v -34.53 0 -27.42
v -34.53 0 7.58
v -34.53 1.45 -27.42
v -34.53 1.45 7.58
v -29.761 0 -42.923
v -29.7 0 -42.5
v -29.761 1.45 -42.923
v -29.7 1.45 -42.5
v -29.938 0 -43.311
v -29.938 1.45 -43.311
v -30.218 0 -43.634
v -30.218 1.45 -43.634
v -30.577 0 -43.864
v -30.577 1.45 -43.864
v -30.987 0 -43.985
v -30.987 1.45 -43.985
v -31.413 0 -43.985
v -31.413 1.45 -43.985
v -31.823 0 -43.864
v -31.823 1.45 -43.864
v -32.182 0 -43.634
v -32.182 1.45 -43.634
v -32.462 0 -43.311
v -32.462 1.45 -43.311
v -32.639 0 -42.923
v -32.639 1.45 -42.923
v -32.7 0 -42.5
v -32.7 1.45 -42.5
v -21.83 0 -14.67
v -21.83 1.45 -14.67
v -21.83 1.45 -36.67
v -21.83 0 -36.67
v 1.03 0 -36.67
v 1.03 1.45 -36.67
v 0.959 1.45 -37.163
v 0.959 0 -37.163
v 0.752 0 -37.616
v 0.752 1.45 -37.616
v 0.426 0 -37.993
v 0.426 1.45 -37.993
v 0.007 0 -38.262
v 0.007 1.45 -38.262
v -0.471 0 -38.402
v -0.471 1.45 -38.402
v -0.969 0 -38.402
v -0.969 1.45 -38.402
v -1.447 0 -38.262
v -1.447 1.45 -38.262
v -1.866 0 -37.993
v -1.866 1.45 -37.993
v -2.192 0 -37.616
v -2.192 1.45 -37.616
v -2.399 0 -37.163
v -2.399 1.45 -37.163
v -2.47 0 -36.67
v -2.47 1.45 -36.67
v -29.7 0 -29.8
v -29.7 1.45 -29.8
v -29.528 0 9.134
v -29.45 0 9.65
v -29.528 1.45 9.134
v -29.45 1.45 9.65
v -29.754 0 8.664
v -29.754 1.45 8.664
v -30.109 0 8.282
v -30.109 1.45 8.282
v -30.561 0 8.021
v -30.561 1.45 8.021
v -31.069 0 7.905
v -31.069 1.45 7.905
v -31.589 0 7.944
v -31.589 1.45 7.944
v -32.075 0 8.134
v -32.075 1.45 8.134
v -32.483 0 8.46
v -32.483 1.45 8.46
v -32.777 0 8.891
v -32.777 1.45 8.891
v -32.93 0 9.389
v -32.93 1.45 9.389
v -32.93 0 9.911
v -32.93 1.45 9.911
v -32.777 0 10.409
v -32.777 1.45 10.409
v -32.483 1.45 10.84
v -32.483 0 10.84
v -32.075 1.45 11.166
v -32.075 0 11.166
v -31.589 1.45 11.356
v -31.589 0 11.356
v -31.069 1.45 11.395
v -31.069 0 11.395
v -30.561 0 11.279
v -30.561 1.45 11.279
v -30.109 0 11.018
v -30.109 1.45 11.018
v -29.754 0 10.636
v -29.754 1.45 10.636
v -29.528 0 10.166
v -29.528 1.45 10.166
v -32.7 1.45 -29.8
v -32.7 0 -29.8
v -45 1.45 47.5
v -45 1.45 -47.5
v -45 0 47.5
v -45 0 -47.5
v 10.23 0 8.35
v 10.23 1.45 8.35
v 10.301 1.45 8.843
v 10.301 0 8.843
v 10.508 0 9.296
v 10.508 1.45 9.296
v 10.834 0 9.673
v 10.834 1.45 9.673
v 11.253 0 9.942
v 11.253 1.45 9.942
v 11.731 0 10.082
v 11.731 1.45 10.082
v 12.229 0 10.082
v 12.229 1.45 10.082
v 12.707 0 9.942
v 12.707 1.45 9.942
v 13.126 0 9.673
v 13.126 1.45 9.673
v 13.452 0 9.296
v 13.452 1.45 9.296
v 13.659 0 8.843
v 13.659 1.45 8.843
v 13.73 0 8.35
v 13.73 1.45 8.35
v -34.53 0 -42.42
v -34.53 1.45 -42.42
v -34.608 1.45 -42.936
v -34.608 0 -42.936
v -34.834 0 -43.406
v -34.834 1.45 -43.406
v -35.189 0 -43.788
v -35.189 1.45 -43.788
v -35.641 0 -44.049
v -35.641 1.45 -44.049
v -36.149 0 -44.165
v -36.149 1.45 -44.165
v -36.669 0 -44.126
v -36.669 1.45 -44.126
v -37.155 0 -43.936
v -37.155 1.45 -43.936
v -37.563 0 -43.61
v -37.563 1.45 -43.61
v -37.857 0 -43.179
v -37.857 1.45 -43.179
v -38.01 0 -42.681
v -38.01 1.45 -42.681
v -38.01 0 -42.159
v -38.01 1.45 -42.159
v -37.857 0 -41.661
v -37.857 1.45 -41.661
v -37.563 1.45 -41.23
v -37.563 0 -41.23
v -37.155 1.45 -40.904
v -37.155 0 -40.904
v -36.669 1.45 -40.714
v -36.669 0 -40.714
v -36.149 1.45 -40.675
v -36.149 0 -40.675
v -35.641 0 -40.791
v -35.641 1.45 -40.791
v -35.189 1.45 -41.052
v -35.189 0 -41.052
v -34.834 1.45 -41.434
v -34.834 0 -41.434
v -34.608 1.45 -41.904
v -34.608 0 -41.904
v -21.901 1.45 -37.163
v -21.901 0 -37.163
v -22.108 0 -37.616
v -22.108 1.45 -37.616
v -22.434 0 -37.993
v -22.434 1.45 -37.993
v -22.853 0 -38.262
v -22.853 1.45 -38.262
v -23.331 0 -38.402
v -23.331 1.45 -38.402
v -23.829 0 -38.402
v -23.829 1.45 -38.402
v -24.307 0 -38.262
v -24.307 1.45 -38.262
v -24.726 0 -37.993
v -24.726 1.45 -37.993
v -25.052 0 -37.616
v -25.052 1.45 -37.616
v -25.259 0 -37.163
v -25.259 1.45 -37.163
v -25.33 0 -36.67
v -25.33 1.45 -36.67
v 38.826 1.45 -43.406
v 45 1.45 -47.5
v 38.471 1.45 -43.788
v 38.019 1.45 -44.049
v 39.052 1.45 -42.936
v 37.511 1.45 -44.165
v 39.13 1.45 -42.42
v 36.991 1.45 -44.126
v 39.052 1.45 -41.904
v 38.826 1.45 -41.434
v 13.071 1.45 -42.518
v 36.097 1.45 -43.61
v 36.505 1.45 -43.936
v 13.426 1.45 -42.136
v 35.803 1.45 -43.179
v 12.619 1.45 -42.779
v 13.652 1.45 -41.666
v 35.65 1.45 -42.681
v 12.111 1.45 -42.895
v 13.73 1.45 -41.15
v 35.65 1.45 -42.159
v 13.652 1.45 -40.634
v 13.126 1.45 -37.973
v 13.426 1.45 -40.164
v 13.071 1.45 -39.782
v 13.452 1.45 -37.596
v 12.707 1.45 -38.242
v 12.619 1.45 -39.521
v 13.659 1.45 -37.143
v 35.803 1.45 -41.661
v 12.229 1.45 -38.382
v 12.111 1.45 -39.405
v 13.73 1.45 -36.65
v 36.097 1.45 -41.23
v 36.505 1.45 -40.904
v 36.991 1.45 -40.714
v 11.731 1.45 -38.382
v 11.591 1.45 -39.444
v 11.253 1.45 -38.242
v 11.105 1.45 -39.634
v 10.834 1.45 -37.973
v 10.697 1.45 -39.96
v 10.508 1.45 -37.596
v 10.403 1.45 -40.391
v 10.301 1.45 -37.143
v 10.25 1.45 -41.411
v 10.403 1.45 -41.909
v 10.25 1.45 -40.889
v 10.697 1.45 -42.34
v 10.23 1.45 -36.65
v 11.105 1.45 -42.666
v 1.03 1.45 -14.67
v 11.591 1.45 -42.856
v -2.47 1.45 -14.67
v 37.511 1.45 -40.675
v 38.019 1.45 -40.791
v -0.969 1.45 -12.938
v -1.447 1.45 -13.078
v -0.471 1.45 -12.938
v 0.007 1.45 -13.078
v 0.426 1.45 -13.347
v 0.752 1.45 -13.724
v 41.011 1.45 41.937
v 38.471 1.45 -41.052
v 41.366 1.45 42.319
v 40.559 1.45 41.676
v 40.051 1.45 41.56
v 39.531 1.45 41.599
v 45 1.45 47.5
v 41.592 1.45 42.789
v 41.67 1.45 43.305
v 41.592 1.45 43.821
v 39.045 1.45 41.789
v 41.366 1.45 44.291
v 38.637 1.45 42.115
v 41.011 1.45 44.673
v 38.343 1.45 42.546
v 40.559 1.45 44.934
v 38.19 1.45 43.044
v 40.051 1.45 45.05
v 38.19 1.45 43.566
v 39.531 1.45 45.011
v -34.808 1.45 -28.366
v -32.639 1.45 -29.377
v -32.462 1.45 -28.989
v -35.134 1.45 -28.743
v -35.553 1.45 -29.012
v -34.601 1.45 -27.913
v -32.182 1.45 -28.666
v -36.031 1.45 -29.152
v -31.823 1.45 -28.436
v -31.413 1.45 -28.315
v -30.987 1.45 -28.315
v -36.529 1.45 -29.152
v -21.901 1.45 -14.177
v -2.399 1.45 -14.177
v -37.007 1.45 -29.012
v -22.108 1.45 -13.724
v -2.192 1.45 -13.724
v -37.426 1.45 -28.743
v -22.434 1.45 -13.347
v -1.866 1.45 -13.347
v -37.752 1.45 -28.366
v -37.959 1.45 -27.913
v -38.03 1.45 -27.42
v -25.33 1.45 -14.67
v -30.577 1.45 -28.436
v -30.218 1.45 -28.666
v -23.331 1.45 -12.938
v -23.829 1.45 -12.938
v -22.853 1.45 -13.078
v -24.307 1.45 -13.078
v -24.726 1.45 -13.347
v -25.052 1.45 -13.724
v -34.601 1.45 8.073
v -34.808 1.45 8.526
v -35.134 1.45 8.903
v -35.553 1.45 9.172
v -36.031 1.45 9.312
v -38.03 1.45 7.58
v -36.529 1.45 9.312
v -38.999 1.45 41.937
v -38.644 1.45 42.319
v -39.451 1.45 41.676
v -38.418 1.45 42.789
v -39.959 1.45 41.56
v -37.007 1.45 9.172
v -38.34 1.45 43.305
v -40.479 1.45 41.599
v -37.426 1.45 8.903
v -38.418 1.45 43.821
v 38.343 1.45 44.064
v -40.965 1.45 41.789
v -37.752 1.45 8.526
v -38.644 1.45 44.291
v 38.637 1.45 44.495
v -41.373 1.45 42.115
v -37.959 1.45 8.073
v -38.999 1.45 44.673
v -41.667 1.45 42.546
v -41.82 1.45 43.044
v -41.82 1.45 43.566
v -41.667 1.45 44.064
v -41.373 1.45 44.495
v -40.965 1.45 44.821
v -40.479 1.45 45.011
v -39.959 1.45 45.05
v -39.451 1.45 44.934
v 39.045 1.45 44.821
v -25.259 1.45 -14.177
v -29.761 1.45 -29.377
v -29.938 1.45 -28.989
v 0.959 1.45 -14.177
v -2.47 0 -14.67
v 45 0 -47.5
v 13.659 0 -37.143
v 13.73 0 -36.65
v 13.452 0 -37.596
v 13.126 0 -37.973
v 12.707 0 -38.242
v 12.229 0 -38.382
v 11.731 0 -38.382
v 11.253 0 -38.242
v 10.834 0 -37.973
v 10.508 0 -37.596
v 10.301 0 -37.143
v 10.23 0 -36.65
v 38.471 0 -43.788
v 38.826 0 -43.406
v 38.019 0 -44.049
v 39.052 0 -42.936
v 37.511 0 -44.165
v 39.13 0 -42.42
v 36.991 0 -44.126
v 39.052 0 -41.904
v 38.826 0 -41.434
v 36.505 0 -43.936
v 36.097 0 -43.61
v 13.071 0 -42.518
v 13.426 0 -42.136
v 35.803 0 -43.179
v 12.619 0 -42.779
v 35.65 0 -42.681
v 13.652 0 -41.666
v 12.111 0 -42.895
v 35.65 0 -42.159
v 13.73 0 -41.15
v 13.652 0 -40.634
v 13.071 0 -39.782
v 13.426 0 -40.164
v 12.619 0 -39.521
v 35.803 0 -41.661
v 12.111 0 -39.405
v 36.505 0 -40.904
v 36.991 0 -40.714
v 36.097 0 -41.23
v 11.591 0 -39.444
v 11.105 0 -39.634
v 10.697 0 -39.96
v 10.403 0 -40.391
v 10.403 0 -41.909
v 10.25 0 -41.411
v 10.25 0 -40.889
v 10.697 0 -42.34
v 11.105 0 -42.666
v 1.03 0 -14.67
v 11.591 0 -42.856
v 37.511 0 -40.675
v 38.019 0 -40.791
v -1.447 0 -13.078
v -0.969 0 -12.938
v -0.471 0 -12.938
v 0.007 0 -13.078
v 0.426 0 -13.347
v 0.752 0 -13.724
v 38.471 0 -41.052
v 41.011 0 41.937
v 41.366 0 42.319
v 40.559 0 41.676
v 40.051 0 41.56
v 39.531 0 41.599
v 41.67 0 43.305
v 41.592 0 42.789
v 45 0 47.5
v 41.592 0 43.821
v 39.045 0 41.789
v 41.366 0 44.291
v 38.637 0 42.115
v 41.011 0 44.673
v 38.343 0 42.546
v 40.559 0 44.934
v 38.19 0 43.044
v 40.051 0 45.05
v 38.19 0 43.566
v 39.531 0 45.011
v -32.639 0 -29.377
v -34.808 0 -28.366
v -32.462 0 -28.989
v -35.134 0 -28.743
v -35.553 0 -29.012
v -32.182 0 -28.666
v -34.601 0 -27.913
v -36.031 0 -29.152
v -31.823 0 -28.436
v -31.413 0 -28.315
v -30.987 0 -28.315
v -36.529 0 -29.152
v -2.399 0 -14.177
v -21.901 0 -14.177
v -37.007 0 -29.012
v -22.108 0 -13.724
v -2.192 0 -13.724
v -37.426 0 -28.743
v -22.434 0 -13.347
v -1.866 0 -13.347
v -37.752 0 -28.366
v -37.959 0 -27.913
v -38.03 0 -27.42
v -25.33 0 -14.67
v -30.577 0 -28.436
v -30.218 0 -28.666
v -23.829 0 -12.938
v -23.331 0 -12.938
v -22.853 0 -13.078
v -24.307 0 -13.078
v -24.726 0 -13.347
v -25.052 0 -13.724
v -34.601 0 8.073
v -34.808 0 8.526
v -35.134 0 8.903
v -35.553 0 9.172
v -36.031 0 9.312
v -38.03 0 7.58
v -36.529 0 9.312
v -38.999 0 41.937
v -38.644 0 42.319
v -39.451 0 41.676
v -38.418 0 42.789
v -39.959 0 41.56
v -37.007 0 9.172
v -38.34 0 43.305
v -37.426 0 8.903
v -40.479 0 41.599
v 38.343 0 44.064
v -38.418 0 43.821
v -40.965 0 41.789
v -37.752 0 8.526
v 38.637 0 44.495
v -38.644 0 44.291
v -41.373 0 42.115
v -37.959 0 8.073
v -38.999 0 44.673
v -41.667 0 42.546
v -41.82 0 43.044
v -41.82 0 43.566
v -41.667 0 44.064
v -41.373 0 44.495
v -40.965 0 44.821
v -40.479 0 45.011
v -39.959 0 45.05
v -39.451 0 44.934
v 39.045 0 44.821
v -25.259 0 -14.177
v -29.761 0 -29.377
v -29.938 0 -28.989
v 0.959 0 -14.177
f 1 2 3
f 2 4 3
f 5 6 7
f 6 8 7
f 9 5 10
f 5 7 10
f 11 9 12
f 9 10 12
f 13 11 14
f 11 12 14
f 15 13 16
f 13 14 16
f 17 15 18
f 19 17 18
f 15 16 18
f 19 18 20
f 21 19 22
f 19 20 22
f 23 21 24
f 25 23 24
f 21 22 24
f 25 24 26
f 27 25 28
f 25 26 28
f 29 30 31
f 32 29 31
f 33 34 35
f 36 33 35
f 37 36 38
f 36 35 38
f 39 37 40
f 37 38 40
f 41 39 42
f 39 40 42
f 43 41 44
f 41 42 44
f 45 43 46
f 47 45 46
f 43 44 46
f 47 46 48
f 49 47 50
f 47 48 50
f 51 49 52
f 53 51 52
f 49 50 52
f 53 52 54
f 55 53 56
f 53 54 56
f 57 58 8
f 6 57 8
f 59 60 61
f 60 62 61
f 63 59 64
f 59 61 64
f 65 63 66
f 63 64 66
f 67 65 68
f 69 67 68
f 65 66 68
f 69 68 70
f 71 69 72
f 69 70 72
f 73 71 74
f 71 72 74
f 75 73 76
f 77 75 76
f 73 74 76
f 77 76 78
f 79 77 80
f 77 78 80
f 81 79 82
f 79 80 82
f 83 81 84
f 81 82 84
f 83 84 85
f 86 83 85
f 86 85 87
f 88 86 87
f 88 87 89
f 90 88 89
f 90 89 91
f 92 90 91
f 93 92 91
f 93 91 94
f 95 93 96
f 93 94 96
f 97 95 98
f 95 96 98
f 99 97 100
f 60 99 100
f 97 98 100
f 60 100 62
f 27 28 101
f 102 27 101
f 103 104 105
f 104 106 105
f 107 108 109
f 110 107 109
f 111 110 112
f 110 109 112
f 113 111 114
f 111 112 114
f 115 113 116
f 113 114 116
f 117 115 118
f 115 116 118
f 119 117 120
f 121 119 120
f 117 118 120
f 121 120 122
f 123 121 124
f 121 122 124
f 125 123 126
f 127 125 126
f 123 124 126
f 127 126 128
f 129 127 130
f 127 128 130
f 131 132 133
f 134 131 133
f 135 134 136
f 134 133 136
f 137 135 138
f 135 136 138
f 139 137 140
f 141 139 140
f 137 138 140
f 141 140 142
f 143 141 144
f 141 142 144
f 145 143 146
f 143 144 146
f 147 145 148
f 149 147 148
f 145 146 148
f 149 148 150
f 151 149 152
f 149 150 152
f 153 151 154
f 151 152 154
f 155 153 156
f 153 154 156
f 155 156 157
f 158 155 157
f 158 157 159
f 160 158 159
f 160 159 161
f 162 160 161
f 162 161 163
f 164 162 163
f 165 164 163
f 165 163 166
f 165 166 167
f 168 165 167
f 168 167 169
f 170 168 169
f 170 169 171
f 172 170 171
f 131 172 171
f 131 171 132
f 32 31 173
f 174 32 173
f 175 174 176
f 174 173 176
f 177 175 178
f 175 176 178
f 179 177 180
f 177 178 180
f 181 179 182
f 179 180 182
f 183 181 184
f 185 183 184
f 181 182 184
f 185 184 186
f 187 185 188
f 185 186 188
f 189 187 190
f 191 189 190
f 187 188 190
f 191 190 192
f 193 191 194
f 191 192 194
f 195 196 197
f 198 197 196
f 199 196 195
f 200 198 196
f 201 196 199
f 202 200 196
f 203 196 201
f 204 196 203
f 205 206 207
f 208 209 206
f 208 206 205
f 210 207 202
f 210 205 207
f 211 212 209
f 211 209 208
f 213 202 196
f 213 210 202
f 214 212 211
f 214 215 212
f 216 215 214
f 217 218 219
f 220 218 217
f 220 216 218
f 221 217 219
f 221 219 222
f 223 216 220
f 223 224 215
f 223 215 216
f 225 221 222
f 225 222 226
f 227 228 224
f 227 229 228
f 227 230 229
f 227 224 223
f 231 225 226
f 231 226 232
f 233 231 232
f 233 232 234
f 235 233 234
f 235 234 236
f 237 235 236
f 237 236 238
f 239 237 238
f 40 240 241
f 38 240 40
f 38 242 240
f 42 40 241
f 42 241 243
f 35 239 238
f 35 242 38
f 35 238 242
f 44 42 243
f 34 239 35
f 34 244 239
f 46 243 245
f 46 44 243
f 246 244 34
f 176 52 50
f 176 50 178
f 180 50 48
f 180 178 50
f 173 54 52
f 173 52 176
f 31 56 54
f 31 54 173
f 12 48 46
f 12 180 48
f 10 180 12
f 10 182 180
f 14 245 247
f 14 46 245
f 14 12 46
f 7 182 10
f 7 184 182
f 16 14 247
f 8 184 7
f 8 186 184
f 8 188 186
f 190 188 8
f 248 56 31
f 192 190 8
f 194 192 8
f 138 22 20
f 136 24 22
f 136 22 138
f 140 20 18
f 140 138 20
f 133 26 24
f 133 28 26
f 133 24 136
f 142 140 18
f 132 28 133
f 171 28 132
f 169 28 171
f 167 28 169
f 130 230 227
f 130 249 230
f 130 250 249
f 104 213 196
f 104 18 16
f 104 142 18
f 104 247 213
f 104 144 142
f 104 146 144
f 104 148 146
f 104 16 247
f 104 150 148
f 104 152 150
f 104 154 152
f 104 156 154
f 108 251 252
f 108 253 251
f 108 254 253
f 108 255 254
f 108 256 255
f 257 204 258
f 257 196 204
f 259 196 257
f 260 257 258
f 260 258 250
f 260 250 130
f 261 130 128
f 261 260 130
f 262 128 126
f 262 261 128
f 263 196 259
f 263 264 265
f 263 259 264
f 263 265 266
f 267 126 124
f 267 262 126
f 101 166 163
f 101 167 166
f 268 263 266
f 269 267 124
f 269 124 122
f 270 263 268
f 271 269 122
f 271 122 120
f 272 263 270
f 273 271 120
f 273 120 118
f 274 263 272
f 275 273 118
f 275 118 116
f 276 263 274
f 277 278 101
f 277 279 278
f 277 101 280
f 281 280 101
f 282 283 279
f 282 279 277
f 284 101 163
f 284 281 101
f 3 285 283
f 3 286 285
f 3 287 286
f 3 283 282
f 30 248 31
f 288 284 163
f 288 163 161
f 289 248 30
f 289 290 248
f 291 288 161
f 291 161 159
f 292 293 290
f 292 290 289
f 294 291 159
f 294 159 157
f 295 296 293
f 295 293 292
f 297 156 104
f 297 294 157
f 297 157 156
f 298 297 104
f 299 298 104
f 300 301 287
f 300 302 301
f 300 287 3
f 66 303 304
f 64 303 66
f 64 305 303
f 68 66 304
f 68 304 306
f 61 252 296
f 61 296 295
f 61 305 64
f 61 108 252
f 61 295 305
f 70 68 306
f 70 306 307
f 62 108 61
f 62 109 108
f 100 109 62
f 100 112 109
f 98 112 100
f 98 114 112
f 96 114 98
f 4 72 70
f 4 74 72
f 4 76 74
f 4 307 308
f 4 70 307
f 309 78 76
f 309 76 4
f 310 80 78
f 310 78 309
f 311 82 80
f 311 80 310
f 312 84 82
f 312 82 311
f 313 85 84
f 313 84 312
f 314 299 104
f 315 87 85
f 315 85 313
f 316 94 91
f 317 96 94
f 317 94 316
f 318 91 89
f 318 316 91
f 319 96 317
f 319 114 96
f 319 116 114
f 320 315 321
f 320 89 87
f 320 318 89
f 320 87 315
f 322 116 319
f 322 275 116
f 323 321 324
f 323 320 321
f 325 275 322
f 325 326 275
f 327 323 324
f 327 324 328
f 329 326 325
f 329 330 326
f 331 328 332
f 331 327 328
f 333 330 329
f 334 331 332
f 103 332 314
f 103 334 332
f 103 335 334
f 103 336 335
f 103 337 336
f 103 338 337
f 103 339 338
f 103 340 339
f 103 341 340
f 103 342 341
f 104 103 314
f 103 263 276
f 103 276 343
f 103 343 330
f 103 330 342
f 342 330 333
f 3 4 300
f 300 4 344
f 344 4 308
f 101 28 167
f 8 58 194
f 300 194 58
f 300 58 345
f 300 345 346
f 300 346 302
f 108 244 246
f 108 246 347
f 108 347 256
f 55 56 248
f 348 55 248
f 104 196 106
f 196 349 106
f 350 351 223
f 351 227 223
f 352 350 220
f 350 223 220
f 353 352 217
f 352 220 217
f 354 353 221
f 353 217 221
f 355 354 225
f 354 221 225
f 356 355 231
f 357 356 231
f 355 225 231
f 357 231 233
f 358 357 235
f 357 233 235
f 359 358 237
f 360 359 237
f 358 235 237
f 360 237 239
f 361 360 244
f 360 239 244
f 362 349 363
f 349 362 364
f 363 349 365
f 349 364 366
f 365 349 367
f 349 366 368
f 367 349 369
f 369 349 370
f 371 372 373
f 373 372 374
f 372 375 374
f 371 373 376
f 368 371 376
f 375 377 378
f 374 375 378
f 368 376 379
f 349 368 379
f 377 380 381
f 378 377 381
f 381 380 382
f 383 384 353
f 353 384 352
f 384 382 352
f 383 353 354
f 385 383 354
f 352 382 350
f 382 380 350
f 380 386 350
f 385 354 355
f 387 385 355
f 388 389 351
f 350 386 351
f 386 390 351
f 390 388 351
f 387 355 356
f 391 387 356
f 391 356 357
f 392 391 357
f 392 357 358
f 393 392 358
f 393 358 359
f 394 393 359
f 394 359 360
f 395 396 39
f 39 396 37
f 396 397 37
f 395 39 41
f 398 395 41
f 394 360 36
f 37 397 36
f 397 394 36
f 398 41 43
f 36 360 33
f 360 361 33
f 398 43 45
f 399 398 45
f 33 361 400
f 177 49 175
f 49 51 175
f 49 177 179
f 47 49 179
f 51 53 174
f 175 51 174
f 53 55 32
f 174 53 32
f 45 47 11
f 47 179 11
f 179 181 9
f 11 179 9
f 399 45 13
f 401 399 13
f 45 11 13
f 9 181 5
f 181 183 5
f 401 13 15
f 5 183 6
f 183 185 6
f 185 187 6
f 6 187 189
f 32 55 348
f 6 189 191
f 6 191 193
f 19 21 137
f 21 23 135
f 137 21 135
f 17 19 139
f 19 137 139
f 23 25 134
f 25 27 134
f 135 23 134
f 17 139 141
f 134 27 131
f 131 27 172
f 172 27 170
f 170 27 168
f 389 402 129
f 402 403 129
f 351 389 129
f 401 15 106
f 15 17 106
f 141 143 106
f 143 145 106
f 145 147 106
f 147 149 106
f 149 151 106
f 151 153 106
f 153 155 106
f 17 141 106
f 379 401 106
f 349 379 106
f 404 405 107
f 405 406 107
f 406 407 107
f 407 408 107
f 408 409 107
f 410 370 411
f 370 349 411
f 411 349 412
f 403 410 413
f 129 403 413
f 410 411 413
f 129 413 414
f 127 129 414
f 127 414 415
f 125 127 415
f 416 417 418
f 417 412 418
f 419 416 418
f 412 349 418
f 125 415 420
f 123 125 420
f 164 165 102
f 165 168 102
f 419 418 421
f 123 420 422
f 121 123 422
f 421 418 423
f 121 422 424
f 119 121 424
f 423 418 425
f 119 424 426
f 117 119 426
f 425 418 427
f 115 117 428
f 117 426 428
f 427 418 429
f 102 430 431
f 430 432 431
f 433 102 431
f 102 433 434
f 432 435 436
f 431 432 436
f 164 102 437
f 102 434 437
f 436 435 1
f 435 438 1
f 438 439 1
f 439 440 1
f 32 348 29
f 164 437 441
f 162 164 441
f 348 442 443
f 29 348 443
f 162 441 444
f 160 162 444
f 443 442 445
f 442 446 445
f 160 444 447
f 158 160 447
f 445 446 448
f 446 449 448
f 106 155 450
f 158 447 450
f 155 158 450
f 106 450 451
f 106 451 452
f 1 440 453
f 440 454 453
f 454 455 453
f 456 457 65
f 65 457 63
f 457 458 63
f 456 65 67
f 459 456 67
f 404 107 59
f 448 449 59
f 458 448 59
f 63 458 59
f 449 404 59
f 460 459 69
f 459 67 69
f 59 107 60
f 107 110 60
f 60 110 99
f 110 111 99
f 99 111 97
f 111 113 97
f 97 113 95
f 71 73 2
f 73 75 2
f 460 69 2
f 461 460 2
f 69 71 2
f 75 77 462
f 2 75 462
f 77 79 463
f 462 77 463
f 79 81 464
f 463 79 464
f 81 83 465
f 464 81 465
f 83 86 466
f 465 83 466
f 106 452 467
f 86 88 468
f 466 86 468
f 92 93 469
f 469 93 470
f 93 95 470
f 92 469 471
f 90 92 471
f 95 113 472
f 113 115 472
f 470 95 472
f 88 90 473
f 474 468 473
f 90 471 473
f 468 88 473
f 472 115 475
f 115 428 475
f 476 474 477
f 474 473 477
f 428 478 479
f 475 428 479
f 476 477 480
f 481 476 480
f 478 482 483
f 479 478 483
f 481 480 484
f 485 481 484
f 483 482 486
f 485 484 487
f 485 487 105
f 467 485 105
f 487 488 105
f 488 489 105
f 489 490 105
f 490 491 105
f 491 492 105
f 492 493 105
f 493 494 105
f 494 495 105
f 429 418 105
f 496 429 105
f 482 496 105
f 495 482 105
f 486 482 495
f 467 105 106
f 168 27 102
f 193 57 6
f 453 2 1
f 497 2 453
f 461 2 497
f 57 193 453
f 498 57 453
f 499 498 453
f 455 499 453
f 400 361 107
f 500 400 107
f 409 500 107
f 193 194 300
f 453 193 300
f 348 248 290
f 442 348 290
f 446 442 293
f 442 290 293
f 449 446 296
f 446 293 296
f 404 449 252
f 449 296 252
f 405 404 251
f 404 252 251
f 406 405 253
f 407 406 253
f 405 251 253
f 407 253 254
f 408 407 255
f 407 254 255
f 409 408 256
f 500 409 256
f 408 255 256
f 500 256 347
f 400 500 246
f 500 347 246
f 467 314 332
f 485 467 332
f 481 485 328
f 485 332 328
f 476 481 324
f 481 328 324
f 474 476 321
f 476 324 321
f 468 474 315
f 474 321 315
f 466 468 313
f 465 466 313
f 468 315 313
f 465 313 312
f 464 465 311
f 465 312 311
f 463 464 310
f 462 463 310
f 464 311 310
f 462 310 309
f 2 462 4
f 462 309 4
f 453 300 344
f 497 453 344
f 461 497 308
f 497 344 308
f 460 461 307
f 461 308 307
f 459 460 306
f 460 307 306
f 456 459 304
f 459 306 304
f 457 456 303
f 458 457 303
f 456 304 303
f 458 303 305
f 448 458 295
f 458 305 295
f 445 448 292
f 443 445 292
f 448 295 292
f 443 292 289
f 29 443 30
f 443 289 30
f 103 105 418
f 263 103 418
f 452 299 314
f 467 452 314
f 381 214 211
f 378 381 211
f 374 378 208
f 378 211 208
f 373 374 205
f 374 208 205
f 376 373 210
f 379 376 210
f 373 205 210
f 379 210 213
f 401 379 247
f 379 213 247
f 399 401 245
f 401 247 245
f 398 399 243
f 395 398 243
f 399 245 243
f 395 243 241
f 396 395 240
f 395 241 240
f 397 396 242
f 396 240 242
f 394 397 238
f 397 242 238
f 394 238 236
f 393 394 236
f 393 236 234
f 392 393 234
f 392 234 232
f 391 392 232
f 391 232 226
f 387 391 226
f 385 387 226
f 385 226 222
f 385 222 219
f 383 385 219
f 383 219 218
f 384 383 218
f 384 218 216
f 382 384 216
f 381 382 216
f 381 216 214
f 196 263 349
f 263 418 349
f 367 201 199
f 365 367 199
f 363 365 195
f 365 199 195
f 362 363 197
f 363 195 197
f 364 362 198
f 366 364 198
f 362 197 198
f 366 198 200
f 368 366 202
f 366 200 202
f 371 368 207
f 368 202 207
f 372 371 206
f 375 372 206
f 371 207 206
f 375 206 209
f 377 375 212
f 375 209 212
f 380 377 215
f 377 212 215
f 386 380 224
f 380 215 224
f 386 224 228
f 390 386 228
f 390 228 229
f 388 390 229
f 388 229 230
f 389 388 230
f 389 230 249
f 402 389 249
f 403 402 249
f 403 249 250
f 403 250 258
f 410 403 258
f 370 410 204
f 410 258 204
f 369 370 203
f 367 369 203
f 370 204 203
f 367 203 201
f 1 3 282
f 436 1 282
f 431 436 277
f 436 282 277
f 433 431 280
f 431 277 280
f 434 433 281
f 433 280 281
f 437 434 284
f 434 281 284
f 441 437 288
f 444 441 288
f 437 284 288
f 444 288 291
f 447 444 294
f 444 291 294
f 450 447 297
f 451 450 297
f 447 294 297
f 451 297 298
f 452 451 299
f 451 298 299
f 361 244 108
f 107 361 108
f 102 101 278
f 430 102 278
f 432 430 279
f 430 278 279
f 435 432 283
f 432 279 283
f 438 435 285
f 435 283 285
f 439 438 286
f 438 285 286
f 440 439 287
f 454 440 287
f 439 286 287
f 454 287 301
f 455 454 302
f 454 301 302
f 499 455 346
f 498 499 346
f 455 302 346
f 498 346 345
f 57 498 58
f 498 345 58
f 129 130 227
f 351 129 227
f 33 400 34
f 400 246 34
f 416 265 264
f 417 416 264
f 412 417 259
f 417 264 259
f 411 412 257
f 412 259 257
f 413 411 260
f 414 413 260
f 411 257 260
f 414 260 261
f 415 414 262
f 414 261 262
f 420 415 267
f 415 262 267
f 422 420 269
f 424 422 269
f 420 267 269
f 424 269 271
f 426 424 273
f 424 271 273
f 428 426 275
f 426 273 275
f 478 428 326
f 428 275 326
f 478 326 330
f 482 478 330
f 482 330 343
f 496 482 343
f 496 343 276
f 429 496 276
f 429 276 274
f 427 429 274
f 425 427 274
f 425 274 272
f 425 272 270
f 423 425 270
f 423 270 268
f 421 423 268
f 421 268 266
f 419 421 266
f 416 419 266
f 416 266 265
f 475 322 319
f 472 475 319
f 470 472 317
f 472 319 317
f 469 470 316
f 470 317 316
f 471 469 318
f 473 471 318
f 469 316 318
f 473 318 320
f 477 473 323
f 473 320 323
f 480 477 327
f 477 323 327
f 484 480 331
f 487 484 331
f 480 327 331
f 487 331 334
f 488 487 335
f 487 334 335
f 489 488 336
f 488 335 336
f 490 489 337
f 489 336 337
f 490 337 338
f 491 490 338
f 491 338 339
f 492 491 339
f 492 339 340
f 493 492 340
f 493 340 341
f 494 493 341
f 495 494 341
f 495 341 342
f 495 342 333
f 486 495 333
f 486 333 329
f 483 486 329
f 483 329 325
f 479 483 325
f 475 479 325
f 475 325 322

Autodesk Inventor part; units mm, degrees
ref_plane "YZ Plane" through (0, 0, 0) normal (1, 0, 0) x (0, 1, 0)
ref_plane "XZ Plane" through (0, 0, 0) normal (0, 1, 0) x (-1, 0, 0)
ref_plane "XY Plane" through (0, 0, 0) normal (0, 0, 1) x (1, 0, 0)
sketch "Sketch1" plane through (0, 0, 0) normal (0, 1, 0) x (-1, 0, 0)
  line L0 (45, 47.5) -> (-45, 47.5)
  line L1 (-45, 47.5) -> (-45, -47.5)
  line L2 (-45, -47.5) -> (45, -47.5)
  line L3 (45, -47.5) -> (45, 47.5)
  line L4 (45, 47.5) -> (-45, -47.5) construction
  line L5 (-45, 47.5) -> (45, -47.5) construction
  point P0 (0, 0)
  dimension "d0" = 95
  dimension "d1" = 90
extrude "Extrusion1" add sketch "Sketch1" along normal blind 1.45
sketch "Sketch2" plane through (0, 1.45, 0) normal (0, 1, 0) x (1, 0, 0)
  circle A0 centre (37.38, 42.42) radius 1.75
  circle A1 centre (-40.09, -43.305) radius 1.75
  circle A2 centre (39.92, -43.305) radius 1.75
  circle A3 centre (-36.28, 42.42) radius 1.75
  line L0 (-45, 47.5) -> (-45, -47.5) projected
  line L1 (45, 47.5) -> (-45, 47.5) projected
  line L2 (45, -47.5) -> (45, 47.5) projected
  point P0 (0, 0)
  dimension "d4" = 3.5
  dimension "d5" = 3.5
  dimension "d6" = 3.5
  dimension "d7" = 3.5
  dimension "d46" = 73.66
  dimension "d47" = 7.62
  dimension "d48" = 5.08
  dimension "d49" = 85.725
  dimension "d50" = 80.01
  dimension "d51" = 2.54
extrude "Extrusion2" cut sketch "Sketch2" against normal through all
sketch "Sketch3" plane through (0, 1.45, 0) normal (0, 1, 0) x (1, 0, 0)
  circle A0 centre (-36.28, 42.42) radius 1.75
  circle A1 centre (11.98, 41.15) radius 1.75
  line L0 (45, 47.5) -> (-45, 47.5) projected
  circle A2 centre (-31.2, -9.65) radius 1.75
  circle A3 centre (-36.28, 42.42) radius 1.75 projected
  point P0 (0, 0)
  dimension "d18" = 3.5
  dimension "d19" = 3.5
  dimension "d22" = 48.26
  dimension "d23" = 1.27
  dimension "d24" = 3.5
  dimension "d25" = 5.08
  dimension "d26" = 52.07
  dimension "d44" = 0
  dimension "d45" = 0
extrude "Extrusion3" cut sketch "Sketch3" against normal blind 10
sketch "Sketch4" plane through (0, 1.45, 0) normal (0, 1, 0) x (1, 0, 0)
  line L0 (-36.28, 27.42) -> (-36.28, -7.58) construction
  line L1 (-38.03, 27.42) -> (-38.03, -7.58)
  line L2 (-34.53, -7.58) -> (-34.53, 27.42)
  arc A0 (-34.53, 27.42) -> (-38.03, 27.42) centre (-36.28, 27.42) ccw
  arc A1 (-38.03, -7.58) -> (-34.53, -7.58) centre (-36.28, -7.58) ccw
  line L3 (11.98, 36.65) -> (11.98, -8.35) construction
  line L4 (10.23, 36.65) -> (10.23, -8.35)
  line L5 (13.73, -8.35) -> (13.73, 36.65)
  arc A2 (13.73, 36.65) -> (10.23, 36.65) centre (11.98, 36.65) ccw
  arc A3 (10.23, -8.35) -> (13.73, -8.35) centre (11.98, -8.35) ccw
  circle A4 centre (-36.28, 42.42) radius 1.75 projected
  circle A5 centre (11.98, 41.15) radius 1.75 projected
  line L6 (-23.58, 36.67) -> (-23.58, 14.67) construction
  line L7 (-25.33, 36.67) -> (-25.33, 14.67)
  line L8 (-21.83, 14.67) -> (-21.83, 36.67)
  arc A6 (-21.83, 36.67) -> (-25.33, 36.67) centre (-23.58, 36.67) ccw
  arc A7 (-25.33, 14.67) -> (-21.83, 14.67) centre (-23.58, 14.67) ccw
  line L9 (-0.72, 36.67) -> (-0.72, 14.67) construction
  line L10 (-2.47, 36.67) -> (-2.47, 14.67)
  line L11 (1.03, 14.67) -> (1.03, 36.67)
  arc A8 (1.03, 36.67) -> (-2.47, 36.67) centre (-0.72, 36.67) ccw
  arc A9 (-2.47, 14.67) -> (1.03, 14.67) centre (-0.72, 14.67) ccw
  line L12 (-31.2, 42.5) -> (-31.2, 29.8) construction
  line L13 (-32.7, 42.5) -> (-32.7, 29.8)
  line L14 (-29.7, 29.8) -> (-29.7, 42.5)
  arc A10 (-29.7, 42.5) -> (-32.7, 42.5) centre (-31.2, 42.5) ccw
  arc A11 (-32.7, 29.8) -> (-29.7, 29.8) centre (-31.2, 29.8) ccw
  line L15 (45, 47.5) -> (-45, 47.5) projected
  line L16 (-45, 47.5) -> (-45, -47.5) projected
  point P0 (0, 0)
  point P1 (-36.28, 9.92)
  point P2 (11.98, 14.15)
  point P3 (-23.58, 25.67)
  point P4 (-0.72, 25.67)
  point P5 (-23.58, 38.42)
  point P6 (-31.2, 36.15)
  dimension "d28" = 3.5
  dimension "d29" = 3.5
  dimension "d30" = 15
  dimension "d31" = 35
  dimension "d32" = 4.5
  dimension "d33" = 45
  dimension "d34" = 12.7
  dimension "d35" = 35.56
  dimension "d36" = 3.5
  dimension "d37" = 3.5
  dimension "d38" = 22
  dimension "d41" = 4
  dimension "d52" = 3
  dimension "d53" = 5
  dimension "d54" = 12.7
  dimension "d56" = 5.08
extrude "Extrusion4" cut sketch "Sketch4" against normal blind 10 contours A0 L2 A1 L1 | A2 L5 A3 L4 | A6 L8 A7 L7 | A8 L11 A9 L10 | A10 L14 A11 L13
properties part number "empty_board" material "ABS Plastic"
